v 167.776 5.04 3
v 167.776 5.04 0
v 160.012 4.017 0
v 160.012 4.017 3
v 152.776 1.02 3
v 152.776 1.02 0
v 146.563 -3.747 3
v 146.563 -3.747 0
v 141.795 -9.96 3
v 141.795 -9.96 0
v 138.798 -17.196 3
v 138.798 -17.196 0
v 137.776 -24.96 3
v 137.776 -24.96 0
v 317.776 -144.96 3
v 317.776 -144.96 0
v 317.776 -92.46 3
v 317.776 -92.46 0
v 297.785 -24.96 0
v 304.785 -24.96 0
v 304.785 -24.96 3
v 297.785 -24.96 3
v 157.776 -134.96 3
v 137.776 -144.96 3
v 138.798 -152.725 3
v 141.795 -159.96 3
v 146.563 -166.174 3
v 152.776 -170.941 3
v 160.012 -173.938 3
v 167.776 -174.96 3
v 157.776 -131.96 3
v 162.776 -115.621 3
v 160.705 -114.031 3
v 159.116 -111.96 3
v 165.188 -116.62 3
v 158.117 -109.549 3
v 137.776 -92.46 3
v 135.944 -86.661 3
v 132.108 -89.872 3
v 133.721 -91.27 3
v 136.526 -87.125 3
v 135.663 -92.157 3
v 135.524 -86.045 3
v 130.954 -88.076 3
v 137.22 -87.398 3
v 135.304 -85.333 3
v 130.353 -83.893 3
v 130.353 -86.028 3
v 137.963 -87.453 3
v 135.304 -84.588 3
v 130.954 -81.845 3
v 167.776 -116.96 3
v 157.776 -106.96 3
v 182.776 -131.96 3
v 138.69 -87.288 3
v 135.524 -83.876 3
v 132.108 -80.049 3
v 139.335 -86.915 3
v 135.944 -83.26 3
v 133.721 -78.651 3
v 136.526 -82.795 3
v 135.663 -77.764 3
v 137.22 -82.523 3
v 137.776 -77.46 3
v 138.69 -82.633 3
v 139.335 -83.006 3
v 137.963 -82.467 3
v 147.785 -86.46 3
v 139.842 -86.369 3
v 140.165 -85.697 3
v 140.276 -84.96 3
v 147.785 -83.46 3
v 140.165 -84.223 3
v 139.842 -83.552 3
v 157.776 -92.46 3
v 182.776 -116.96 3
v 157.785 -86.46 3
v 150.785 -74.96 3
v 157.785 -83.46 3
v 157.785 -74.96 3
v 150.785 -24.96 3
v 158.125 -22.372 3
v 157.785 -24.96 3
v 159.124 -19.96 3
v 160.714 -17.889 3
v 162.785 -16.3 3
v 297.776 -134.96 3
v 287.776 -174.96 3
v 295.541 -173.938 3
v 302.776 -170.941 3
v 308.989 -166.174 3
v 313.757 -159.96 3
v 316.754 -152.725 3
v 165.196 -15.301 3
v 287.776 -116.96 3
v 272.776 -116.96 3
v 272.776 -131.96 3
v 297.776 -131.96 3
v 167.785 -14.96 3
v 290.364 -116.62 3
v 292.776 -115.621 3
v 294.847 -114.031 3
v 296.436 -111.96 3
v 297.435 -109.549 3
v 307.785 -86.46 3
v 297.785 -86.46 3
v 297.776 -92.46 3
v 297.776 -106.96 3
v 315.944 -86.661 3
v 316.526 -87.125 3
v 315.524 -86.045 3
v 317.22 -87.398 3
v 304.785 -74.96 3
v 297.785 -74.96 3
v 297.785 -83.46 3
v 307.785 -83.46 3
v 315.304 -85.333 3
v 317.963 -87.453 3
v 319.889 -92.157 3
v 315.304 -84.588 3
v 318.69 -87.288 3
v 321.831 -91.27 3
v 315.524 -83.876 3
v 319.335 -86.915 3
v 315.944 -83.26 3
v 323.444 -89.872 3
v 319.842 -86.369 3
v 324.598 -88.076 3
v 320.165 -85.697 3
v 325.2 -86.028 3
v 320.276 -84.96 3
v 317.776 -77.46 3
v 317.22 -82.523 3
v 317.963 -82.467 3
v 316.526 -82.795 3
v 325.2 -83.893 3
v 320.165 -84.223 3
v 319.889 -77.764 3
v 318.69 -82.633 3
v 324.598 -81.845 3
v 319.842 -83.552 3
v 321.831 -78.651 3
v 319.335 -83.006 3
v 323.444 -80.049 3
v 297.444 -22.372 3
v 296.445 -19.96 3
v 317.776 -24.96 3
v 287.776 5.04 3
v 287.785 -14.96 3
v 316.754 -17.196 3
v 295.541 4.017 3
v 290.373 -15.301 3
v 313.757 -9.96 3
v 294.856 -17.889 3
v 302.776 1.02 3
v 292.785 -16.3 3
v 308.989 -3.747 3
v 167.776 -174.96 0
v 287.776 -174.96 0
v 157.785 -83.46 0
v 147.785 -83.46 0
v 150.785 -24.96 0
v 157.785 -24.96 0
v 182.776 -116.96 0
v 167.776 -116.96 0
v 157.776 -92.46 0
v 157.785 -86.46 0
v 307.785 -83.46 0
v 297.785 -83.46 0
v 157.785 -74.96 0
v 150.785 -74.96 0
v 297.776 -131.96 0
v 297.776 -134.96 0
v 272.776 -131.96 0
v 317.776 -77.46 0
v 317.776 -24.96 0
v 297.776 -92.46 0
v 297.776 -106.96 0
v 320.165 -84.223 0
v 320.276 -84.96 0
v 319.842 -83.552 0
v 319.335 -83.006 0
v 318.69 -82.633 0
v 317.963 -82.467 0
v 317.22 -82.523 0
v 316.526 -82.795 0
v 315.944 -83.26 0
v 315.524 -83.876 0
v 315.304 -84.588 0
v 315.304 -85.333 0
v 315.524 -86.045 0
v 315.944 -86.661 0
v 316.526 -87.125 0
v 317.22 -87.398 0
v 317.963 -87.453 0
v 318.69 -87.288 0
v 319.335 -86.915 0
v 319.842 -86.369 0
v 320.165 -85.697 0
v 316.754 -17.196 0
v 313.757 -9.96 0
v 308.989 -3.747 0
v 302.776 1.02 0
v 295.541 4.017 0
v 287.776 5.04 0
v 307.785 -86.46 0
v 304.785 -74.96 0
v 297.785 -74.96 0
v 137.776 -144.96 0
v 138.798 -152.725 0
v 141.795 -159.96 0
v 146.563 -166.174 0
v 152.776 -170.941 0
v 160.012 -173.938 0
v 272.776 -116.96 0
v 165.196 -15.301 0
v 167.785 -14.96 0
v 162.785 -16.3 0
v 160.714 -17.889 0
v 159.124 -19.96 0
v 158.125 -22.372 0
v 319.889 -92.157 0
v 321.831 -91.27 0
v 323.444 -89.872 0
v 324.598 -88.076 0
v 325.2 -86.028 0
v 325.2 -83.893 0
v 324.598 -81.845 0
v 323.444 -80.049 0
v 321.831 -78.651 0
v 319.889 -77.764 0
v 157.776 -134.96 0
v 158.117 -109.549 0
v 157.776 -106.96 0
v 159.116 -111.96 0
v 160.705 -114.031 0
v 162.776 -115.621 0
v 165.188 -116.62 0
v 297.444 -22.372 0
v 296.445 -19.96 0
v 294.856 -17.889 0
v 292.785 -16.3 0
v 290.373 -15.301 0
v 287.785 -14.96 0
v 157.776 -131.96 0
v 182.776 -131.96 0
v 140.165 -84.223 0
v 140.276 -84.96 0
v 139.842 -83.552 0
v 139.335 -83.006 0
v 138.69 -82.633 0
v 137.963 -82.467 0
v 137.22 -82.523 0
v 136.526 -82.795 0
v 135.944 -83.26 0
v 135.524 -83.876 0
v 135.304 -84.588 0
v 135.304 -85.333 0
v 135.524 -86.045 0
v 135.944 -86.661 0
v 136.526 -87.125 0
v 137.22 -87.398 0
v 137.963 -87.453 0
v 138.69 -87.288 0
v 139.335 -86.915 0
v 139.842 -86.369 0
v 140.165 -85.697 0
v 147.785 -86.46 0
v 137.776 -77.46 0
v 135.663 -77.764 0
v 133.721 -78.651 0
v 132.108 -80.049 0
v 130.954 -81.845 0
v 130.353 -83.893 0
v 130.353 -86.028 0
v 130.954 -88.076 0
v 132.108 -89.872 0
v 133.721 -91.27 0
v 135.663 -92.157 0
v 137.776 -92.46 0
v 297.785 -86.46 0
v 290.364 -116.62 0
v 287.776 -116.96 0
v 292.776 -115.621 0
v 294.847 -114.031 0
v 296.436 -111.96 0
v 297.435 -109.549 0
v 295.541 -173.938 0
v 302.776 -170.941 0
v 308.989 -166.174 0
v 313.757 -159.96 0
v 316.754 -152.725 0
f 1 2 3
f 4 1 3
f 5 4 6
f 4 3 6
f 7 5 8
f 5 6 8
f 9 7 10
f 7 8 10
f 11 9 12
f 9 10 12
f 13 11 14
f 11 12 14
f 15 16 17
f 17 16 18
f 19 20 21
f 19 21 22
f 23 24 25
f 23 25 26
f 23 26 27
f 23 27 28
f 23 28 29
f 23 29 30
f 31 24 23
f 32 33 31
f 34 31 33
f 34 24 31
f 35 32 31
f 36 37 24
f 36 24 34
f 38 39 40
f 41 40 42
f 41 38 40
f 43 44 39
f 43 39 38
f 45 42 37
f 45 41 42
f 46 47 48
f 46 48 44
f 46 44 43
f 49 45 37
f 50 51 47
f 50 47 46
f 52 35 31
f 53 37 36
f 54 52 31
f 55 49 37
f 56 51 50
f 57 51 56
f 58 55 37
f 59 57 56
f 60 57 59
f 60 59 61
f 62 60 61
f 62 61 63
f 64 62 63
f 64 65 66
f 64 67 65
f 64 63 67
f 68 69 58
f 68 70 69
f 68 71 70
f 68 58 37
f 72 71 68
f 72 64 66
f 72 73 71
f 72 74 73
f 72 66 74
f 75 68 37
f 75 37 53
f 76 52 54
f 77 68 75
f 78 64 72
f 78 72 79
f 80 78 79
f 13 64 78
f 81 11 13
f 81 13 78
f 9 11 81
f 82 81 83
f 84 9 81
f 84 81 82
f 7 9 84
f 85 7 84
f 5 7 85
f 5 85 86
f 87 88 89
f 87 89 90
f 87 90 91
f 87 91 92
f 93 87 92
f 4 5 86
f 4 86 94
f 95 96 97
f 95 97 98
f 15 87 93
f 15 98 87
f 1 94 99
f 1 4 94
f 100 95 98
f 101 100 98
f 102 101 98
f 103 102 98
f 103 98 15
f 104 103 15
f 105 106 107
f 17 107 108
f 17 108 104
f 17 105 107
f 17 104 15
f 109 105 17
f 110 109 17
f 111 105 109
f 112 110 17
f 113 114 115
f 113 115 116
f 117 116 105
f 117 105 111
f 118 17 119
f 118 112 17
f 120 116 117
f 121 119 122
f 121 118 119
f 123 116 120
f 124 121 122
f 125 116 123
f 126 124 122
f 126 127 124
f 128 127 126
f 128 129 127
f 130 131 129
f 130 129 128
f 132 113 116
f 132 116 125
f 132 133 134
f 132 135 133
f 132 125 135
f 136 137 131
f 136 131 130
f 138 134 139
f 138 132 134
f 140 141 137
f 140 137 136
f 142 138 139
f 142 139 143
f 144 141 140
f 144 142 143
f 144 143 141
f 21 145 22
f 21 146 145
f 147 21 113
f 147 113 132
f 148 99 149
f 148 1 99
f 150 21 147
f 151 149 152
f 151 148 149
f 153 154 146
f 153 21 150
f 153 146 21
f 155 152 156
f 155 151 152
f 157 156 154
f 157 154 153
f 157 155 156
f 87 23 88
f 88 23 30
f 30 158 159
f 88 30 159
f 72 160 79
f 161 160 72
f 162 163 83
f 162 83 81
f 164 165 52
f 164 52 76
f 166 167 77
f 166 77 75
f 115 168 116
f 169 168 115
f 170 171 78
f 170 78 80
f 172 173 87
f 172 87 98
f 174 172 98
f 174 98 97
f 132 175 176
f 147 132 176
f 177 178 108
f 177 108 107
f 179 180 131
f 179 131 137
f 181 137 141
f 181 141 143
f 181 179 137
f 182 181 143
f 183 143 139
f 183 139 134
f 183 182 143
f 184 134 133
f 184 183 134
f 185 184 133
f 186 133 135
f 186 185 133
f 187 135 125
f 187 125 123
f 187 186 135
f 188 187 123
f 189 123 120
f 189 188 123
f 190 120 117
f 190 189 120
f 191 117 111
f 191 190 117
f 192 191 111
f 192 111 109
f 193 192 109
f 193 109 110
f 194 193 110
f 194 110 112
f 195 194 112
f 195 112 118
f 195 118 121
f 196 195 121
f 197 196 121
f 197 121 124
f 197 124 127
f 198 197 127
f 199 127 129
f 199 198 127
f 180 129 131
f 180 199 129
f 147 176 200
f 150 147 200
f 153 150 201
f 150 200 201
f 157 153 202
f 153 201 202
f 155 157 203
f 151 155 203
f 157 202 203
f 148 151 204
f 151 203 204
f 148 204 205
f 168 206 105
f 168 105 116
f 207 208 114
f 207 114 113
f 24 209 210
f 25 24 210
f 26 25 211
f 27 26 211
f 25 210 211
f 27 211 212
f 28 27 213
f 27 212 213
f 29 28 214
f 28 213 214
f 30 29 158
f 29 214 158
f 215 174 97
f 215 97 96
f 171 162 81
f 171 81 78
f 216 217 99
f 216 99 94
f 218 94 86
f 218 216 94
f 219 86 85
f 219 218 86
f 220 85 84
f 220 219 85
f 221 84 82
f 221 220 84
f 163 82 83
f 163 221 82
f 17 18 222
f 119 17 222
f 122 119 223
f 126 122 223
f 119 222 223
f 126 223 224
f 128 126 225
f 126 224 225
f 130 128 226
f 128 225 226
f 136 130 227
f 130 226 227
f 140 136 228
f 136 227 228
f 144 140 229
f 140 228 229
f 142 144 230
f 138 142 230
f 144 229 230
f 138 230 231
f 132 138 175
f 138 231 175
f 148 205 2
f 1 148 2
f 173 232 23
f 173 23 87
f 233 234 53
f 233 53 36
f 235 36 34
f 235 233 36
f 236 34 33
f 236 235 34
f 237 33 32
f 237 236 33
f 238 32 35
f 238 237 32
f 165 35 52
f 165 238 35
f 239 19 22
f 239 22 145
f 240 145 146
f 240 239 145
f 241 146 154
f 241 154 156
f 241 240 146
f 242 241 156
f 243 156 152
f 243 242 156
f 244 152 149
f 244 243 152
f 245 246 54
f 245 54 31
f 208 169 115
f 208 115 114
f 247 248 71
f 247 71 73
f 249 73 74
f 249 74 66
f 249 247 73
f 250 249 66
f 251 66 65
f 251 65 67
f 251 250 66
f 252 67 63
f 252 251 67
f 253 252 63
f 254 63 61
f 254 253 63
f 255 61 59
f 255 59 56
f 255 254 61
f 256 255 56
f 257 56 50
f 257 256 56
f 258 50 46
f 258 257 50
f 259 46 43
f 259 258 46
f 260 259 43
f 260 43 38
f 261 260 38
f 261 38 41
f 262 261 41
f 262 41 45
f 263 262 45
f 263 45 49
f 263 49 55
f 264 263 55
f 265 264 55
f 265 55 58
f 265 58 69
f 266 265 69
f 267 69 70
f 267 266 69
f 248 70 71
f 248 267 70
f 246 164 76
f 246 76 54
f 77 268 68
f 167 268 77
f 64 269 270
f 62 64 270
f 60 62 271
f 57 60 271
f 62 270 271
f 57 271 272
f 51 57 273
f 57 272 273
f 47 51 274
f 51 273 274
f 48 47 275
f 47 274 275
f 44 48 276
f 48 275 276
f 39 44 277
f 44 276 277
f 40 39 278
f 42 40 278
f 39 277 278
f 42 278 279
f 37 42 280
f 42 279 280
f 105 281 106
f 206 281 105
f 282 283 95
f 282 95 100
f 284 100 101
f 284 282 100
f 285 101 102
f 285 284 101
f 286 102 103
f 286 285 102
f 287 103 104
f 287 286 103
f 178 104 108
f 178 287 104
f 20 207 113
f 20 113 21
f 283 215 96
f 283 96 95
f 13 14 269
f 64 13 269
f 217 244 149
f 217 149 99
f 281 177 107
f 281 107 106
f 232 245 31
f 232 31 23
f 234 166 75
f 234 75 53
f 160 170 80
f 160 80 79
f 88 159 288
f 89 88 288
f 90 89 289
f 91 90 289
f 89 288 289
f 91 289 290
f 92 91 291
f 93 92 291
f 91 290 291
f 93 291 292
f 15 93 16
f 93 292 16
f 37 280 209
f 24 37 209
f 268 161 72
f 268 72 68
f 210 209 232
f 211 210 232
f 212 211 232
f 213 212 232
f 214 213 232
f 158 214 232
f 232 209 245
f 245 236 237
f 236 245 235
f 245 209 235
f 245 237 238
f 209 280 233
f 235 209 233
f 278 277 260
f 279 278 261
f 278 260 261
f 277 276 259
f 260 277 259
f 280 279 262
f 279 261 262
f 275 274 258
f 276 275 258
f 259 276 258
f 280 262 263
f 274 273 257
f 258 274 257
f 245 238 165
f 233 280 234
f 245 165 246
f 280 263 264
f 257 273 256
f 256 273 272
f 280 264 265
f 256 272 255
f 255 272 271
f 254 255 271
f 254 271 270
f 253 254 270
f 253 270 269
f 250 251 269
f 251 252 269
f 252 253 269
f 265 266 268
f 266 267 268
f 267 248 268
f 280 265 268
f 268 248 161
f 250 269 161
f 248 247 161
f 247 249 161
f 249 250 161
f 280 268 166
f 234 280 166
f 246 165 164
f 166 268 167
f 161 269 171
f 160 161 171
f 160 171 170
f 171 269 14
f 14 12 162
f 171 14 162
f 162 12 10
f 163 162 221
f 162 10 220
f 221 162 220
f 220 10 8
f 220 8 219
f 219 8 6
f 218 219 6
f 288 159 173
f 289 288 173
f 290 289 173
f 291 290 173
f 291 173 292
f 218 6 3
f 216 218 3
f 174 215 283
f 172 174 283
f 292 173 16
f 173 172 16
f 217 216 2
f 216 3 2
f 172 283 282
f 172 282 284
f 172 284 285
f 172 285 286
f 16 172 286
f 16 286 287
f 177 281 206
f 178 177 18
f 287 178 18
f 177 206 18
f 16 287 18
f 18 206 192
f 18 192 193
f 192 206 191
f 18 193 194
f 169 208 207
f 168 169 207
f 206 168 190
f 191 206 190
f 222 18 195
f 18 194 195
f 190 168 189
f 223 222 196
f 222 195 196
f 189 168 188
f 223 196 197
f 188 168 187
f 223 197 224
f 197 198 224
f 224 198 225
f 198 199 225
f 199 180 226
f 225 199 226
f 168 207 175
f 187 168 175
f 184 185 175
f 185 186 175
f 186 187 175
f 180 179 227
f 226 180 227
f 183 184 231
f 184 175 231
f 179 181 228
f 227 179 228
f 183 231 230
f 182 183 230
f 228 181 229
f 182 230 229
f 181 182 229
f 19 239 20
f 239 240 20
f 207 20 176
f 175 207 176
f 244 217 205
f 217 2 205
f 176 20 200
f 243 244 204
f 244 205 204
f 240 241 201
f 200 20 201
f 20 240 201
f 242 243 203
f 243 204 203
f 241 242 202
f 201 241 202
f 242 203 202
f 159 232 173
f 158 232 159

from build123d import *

# Parameters (mm, degrees)
SKETCH1_R           = 2.5
BOSS_EXTRUDE1_DEPTH = 3


with BuildPart() as part:
    # Sketch1 → Boss-Extrude1 (new body)
    with BuildSketch(Plane.XY):
        with BuildLine():
            Line((167.77621964, -174.96032759), (287.77621964, -174.96032759))
            ThreePointArc((287.77621964, -174.96032759), (308.989423075, -166.173531026), (317.77621964, -144.96032759))
            Line((317.77621964, -144.96032759), (317.77621964, -92.46032759))
            ThreePointArc((317.77621964, -92.46032759), (325.27621964, -84.96032759), (317.77621964, -77.46032759))
            Line((317.77621964, -77.46032759), (317.77621964, -24.96032759))
            ThreePointArc((317.77621964, -24.96032759), (308.989423075, -3.747124154), (287.77621964, 5.03967241))
            Line((287.77621964, 5.03967241), (167.77621964, 5.03967241))
            ThreePointArc((167.77621964, 5.03967241), (146.563016204, -3.747124154), (137.77621964, -24.96032759))
            Line((137.77621964, -24.96032759), (137.77621964, -77.46032759))
            ThreePointArc((137.77621964, -77.46032759), (130.27621964, -84.96032759), (137.77621964, -92.46032759))
            Line((137.77621964, -92.46032759), (137.77621964, -144.96032759))
            ThreePointArc((137.77621964, -144.96032759), (146.563016204, -166.173531026), (167.77621964, -174.96032759))
        make_face()
        with Locations((317.77621964, -84.96032759)):
            Circle(SKETCH1_R, mode=Mode.SUBTRACT)
        with Locations((137.77621964, -84.96032759)):
            Circle(SKETCH1_R, mode=Mode.SUBTRACT)
        with BuildLine():
            Line((226.284678956, -14.96032759), (167.784678956, -14.96032759))
            ThreePointArc((167.784678956, -14.96032759), (160.713611144, -17.889259778), (157.784678956, -24.96032759))
            Line((157.784678956, -24.96032759), (150.784678956, -24.96032759))
            Line((150.784678956, -24.96032759), (150.784678956, -74.96032759))
            Line((150.784678956, -74.96032759), (157.784678956, -74.96032759))
            Line((157.784678956, -74.96032759), (157.784678956, -83.46032759))
            Line((157.784678956, -83.46032759), (147.784678956, -83.46032759))
            Line((147.784678956, -83.46032759), (147.784678956, -86.46032759))
            Line((147.784678956, -86.46032759), (157.784678956, -86.46032759))
            Line((157.784678956, -86.46032759), (157.77621964, -92.46032759))
            Line((157.77621964, -92.46032759), (157.77621964, -106.96032759))
            ThreePointArc((157.77621964, -106.96032759), (160.705151828, -114.031395402), (167.77621964, -116.96032759))
            Line((167.77621964, -116.96032759), (182.77621964, -116.96032759))
            Line((182.77621964, -116.96032759), (182.77621964, -131.96032759))
            Line((182.77621964, -131.96032759), (157.77621964, -131.96032759))
            Line((157.77621964, -131.96032759), (157.77621964, -134.96032759))
            Line((157.77621964, -134.96032759), (297.77621964, -134.96032759))
            Line((297.77621964, -134.96032759), (297.77621964, -131.96032759))
            Line((297.77621964, -131.96032759), (272.77621964, -131.96032759))
            Line((272.77621964, -131.96032759), (272.77621964, -116.96032759))
            Line((272.77621964, -116.96032759), (287.77621964, -116.96032759))
            ThreePointArc((287.77621964, -116.96032759), (294.847287452, -114.031395402), (297.77621964, -106.96032759))
            Line((297.77621964, -106.96032759), (297.77621964, -92.46032759))
            Line((297.77621964, -92.46032759), (297.784678956, -86.46032759))
            Line((297.784678956, -86.46032759), (307.784678956, -86.46032759))
            Line((307.784678956, -86.46032759), (307.784678956, -83.46032759))
            Line((307.784678956, -83.46032759), (297.784678956, -83.46032759))
            Line((297.784678956, -83.46032759), (297.784678956, -74.96032759))
            Line((297.784678956, -74.96032759), (304.784678956, -74.96032759))
            Line((304.784678956, -74.96032759), (304.784678956, -24.96032759))
            Line((304.784678956, -24.96032759), (297.784678956, -24.96032759))
            ThreePointArc((297.784678956, -24.96032759), (294.855746768, -17.889259778), (287.784678956, -14.96032759))
            Line((287.784678956, -14.96032759), (229.284678956, -14.96032759))
            Line((229.284678956, -14.96032759), (226.284678956, -14.96032759))
        make_face(mode=Mode.SUBTRACT)
    extrude(amount=BOSS_EXTRUDE1_DEPTH)


solid = part.part
